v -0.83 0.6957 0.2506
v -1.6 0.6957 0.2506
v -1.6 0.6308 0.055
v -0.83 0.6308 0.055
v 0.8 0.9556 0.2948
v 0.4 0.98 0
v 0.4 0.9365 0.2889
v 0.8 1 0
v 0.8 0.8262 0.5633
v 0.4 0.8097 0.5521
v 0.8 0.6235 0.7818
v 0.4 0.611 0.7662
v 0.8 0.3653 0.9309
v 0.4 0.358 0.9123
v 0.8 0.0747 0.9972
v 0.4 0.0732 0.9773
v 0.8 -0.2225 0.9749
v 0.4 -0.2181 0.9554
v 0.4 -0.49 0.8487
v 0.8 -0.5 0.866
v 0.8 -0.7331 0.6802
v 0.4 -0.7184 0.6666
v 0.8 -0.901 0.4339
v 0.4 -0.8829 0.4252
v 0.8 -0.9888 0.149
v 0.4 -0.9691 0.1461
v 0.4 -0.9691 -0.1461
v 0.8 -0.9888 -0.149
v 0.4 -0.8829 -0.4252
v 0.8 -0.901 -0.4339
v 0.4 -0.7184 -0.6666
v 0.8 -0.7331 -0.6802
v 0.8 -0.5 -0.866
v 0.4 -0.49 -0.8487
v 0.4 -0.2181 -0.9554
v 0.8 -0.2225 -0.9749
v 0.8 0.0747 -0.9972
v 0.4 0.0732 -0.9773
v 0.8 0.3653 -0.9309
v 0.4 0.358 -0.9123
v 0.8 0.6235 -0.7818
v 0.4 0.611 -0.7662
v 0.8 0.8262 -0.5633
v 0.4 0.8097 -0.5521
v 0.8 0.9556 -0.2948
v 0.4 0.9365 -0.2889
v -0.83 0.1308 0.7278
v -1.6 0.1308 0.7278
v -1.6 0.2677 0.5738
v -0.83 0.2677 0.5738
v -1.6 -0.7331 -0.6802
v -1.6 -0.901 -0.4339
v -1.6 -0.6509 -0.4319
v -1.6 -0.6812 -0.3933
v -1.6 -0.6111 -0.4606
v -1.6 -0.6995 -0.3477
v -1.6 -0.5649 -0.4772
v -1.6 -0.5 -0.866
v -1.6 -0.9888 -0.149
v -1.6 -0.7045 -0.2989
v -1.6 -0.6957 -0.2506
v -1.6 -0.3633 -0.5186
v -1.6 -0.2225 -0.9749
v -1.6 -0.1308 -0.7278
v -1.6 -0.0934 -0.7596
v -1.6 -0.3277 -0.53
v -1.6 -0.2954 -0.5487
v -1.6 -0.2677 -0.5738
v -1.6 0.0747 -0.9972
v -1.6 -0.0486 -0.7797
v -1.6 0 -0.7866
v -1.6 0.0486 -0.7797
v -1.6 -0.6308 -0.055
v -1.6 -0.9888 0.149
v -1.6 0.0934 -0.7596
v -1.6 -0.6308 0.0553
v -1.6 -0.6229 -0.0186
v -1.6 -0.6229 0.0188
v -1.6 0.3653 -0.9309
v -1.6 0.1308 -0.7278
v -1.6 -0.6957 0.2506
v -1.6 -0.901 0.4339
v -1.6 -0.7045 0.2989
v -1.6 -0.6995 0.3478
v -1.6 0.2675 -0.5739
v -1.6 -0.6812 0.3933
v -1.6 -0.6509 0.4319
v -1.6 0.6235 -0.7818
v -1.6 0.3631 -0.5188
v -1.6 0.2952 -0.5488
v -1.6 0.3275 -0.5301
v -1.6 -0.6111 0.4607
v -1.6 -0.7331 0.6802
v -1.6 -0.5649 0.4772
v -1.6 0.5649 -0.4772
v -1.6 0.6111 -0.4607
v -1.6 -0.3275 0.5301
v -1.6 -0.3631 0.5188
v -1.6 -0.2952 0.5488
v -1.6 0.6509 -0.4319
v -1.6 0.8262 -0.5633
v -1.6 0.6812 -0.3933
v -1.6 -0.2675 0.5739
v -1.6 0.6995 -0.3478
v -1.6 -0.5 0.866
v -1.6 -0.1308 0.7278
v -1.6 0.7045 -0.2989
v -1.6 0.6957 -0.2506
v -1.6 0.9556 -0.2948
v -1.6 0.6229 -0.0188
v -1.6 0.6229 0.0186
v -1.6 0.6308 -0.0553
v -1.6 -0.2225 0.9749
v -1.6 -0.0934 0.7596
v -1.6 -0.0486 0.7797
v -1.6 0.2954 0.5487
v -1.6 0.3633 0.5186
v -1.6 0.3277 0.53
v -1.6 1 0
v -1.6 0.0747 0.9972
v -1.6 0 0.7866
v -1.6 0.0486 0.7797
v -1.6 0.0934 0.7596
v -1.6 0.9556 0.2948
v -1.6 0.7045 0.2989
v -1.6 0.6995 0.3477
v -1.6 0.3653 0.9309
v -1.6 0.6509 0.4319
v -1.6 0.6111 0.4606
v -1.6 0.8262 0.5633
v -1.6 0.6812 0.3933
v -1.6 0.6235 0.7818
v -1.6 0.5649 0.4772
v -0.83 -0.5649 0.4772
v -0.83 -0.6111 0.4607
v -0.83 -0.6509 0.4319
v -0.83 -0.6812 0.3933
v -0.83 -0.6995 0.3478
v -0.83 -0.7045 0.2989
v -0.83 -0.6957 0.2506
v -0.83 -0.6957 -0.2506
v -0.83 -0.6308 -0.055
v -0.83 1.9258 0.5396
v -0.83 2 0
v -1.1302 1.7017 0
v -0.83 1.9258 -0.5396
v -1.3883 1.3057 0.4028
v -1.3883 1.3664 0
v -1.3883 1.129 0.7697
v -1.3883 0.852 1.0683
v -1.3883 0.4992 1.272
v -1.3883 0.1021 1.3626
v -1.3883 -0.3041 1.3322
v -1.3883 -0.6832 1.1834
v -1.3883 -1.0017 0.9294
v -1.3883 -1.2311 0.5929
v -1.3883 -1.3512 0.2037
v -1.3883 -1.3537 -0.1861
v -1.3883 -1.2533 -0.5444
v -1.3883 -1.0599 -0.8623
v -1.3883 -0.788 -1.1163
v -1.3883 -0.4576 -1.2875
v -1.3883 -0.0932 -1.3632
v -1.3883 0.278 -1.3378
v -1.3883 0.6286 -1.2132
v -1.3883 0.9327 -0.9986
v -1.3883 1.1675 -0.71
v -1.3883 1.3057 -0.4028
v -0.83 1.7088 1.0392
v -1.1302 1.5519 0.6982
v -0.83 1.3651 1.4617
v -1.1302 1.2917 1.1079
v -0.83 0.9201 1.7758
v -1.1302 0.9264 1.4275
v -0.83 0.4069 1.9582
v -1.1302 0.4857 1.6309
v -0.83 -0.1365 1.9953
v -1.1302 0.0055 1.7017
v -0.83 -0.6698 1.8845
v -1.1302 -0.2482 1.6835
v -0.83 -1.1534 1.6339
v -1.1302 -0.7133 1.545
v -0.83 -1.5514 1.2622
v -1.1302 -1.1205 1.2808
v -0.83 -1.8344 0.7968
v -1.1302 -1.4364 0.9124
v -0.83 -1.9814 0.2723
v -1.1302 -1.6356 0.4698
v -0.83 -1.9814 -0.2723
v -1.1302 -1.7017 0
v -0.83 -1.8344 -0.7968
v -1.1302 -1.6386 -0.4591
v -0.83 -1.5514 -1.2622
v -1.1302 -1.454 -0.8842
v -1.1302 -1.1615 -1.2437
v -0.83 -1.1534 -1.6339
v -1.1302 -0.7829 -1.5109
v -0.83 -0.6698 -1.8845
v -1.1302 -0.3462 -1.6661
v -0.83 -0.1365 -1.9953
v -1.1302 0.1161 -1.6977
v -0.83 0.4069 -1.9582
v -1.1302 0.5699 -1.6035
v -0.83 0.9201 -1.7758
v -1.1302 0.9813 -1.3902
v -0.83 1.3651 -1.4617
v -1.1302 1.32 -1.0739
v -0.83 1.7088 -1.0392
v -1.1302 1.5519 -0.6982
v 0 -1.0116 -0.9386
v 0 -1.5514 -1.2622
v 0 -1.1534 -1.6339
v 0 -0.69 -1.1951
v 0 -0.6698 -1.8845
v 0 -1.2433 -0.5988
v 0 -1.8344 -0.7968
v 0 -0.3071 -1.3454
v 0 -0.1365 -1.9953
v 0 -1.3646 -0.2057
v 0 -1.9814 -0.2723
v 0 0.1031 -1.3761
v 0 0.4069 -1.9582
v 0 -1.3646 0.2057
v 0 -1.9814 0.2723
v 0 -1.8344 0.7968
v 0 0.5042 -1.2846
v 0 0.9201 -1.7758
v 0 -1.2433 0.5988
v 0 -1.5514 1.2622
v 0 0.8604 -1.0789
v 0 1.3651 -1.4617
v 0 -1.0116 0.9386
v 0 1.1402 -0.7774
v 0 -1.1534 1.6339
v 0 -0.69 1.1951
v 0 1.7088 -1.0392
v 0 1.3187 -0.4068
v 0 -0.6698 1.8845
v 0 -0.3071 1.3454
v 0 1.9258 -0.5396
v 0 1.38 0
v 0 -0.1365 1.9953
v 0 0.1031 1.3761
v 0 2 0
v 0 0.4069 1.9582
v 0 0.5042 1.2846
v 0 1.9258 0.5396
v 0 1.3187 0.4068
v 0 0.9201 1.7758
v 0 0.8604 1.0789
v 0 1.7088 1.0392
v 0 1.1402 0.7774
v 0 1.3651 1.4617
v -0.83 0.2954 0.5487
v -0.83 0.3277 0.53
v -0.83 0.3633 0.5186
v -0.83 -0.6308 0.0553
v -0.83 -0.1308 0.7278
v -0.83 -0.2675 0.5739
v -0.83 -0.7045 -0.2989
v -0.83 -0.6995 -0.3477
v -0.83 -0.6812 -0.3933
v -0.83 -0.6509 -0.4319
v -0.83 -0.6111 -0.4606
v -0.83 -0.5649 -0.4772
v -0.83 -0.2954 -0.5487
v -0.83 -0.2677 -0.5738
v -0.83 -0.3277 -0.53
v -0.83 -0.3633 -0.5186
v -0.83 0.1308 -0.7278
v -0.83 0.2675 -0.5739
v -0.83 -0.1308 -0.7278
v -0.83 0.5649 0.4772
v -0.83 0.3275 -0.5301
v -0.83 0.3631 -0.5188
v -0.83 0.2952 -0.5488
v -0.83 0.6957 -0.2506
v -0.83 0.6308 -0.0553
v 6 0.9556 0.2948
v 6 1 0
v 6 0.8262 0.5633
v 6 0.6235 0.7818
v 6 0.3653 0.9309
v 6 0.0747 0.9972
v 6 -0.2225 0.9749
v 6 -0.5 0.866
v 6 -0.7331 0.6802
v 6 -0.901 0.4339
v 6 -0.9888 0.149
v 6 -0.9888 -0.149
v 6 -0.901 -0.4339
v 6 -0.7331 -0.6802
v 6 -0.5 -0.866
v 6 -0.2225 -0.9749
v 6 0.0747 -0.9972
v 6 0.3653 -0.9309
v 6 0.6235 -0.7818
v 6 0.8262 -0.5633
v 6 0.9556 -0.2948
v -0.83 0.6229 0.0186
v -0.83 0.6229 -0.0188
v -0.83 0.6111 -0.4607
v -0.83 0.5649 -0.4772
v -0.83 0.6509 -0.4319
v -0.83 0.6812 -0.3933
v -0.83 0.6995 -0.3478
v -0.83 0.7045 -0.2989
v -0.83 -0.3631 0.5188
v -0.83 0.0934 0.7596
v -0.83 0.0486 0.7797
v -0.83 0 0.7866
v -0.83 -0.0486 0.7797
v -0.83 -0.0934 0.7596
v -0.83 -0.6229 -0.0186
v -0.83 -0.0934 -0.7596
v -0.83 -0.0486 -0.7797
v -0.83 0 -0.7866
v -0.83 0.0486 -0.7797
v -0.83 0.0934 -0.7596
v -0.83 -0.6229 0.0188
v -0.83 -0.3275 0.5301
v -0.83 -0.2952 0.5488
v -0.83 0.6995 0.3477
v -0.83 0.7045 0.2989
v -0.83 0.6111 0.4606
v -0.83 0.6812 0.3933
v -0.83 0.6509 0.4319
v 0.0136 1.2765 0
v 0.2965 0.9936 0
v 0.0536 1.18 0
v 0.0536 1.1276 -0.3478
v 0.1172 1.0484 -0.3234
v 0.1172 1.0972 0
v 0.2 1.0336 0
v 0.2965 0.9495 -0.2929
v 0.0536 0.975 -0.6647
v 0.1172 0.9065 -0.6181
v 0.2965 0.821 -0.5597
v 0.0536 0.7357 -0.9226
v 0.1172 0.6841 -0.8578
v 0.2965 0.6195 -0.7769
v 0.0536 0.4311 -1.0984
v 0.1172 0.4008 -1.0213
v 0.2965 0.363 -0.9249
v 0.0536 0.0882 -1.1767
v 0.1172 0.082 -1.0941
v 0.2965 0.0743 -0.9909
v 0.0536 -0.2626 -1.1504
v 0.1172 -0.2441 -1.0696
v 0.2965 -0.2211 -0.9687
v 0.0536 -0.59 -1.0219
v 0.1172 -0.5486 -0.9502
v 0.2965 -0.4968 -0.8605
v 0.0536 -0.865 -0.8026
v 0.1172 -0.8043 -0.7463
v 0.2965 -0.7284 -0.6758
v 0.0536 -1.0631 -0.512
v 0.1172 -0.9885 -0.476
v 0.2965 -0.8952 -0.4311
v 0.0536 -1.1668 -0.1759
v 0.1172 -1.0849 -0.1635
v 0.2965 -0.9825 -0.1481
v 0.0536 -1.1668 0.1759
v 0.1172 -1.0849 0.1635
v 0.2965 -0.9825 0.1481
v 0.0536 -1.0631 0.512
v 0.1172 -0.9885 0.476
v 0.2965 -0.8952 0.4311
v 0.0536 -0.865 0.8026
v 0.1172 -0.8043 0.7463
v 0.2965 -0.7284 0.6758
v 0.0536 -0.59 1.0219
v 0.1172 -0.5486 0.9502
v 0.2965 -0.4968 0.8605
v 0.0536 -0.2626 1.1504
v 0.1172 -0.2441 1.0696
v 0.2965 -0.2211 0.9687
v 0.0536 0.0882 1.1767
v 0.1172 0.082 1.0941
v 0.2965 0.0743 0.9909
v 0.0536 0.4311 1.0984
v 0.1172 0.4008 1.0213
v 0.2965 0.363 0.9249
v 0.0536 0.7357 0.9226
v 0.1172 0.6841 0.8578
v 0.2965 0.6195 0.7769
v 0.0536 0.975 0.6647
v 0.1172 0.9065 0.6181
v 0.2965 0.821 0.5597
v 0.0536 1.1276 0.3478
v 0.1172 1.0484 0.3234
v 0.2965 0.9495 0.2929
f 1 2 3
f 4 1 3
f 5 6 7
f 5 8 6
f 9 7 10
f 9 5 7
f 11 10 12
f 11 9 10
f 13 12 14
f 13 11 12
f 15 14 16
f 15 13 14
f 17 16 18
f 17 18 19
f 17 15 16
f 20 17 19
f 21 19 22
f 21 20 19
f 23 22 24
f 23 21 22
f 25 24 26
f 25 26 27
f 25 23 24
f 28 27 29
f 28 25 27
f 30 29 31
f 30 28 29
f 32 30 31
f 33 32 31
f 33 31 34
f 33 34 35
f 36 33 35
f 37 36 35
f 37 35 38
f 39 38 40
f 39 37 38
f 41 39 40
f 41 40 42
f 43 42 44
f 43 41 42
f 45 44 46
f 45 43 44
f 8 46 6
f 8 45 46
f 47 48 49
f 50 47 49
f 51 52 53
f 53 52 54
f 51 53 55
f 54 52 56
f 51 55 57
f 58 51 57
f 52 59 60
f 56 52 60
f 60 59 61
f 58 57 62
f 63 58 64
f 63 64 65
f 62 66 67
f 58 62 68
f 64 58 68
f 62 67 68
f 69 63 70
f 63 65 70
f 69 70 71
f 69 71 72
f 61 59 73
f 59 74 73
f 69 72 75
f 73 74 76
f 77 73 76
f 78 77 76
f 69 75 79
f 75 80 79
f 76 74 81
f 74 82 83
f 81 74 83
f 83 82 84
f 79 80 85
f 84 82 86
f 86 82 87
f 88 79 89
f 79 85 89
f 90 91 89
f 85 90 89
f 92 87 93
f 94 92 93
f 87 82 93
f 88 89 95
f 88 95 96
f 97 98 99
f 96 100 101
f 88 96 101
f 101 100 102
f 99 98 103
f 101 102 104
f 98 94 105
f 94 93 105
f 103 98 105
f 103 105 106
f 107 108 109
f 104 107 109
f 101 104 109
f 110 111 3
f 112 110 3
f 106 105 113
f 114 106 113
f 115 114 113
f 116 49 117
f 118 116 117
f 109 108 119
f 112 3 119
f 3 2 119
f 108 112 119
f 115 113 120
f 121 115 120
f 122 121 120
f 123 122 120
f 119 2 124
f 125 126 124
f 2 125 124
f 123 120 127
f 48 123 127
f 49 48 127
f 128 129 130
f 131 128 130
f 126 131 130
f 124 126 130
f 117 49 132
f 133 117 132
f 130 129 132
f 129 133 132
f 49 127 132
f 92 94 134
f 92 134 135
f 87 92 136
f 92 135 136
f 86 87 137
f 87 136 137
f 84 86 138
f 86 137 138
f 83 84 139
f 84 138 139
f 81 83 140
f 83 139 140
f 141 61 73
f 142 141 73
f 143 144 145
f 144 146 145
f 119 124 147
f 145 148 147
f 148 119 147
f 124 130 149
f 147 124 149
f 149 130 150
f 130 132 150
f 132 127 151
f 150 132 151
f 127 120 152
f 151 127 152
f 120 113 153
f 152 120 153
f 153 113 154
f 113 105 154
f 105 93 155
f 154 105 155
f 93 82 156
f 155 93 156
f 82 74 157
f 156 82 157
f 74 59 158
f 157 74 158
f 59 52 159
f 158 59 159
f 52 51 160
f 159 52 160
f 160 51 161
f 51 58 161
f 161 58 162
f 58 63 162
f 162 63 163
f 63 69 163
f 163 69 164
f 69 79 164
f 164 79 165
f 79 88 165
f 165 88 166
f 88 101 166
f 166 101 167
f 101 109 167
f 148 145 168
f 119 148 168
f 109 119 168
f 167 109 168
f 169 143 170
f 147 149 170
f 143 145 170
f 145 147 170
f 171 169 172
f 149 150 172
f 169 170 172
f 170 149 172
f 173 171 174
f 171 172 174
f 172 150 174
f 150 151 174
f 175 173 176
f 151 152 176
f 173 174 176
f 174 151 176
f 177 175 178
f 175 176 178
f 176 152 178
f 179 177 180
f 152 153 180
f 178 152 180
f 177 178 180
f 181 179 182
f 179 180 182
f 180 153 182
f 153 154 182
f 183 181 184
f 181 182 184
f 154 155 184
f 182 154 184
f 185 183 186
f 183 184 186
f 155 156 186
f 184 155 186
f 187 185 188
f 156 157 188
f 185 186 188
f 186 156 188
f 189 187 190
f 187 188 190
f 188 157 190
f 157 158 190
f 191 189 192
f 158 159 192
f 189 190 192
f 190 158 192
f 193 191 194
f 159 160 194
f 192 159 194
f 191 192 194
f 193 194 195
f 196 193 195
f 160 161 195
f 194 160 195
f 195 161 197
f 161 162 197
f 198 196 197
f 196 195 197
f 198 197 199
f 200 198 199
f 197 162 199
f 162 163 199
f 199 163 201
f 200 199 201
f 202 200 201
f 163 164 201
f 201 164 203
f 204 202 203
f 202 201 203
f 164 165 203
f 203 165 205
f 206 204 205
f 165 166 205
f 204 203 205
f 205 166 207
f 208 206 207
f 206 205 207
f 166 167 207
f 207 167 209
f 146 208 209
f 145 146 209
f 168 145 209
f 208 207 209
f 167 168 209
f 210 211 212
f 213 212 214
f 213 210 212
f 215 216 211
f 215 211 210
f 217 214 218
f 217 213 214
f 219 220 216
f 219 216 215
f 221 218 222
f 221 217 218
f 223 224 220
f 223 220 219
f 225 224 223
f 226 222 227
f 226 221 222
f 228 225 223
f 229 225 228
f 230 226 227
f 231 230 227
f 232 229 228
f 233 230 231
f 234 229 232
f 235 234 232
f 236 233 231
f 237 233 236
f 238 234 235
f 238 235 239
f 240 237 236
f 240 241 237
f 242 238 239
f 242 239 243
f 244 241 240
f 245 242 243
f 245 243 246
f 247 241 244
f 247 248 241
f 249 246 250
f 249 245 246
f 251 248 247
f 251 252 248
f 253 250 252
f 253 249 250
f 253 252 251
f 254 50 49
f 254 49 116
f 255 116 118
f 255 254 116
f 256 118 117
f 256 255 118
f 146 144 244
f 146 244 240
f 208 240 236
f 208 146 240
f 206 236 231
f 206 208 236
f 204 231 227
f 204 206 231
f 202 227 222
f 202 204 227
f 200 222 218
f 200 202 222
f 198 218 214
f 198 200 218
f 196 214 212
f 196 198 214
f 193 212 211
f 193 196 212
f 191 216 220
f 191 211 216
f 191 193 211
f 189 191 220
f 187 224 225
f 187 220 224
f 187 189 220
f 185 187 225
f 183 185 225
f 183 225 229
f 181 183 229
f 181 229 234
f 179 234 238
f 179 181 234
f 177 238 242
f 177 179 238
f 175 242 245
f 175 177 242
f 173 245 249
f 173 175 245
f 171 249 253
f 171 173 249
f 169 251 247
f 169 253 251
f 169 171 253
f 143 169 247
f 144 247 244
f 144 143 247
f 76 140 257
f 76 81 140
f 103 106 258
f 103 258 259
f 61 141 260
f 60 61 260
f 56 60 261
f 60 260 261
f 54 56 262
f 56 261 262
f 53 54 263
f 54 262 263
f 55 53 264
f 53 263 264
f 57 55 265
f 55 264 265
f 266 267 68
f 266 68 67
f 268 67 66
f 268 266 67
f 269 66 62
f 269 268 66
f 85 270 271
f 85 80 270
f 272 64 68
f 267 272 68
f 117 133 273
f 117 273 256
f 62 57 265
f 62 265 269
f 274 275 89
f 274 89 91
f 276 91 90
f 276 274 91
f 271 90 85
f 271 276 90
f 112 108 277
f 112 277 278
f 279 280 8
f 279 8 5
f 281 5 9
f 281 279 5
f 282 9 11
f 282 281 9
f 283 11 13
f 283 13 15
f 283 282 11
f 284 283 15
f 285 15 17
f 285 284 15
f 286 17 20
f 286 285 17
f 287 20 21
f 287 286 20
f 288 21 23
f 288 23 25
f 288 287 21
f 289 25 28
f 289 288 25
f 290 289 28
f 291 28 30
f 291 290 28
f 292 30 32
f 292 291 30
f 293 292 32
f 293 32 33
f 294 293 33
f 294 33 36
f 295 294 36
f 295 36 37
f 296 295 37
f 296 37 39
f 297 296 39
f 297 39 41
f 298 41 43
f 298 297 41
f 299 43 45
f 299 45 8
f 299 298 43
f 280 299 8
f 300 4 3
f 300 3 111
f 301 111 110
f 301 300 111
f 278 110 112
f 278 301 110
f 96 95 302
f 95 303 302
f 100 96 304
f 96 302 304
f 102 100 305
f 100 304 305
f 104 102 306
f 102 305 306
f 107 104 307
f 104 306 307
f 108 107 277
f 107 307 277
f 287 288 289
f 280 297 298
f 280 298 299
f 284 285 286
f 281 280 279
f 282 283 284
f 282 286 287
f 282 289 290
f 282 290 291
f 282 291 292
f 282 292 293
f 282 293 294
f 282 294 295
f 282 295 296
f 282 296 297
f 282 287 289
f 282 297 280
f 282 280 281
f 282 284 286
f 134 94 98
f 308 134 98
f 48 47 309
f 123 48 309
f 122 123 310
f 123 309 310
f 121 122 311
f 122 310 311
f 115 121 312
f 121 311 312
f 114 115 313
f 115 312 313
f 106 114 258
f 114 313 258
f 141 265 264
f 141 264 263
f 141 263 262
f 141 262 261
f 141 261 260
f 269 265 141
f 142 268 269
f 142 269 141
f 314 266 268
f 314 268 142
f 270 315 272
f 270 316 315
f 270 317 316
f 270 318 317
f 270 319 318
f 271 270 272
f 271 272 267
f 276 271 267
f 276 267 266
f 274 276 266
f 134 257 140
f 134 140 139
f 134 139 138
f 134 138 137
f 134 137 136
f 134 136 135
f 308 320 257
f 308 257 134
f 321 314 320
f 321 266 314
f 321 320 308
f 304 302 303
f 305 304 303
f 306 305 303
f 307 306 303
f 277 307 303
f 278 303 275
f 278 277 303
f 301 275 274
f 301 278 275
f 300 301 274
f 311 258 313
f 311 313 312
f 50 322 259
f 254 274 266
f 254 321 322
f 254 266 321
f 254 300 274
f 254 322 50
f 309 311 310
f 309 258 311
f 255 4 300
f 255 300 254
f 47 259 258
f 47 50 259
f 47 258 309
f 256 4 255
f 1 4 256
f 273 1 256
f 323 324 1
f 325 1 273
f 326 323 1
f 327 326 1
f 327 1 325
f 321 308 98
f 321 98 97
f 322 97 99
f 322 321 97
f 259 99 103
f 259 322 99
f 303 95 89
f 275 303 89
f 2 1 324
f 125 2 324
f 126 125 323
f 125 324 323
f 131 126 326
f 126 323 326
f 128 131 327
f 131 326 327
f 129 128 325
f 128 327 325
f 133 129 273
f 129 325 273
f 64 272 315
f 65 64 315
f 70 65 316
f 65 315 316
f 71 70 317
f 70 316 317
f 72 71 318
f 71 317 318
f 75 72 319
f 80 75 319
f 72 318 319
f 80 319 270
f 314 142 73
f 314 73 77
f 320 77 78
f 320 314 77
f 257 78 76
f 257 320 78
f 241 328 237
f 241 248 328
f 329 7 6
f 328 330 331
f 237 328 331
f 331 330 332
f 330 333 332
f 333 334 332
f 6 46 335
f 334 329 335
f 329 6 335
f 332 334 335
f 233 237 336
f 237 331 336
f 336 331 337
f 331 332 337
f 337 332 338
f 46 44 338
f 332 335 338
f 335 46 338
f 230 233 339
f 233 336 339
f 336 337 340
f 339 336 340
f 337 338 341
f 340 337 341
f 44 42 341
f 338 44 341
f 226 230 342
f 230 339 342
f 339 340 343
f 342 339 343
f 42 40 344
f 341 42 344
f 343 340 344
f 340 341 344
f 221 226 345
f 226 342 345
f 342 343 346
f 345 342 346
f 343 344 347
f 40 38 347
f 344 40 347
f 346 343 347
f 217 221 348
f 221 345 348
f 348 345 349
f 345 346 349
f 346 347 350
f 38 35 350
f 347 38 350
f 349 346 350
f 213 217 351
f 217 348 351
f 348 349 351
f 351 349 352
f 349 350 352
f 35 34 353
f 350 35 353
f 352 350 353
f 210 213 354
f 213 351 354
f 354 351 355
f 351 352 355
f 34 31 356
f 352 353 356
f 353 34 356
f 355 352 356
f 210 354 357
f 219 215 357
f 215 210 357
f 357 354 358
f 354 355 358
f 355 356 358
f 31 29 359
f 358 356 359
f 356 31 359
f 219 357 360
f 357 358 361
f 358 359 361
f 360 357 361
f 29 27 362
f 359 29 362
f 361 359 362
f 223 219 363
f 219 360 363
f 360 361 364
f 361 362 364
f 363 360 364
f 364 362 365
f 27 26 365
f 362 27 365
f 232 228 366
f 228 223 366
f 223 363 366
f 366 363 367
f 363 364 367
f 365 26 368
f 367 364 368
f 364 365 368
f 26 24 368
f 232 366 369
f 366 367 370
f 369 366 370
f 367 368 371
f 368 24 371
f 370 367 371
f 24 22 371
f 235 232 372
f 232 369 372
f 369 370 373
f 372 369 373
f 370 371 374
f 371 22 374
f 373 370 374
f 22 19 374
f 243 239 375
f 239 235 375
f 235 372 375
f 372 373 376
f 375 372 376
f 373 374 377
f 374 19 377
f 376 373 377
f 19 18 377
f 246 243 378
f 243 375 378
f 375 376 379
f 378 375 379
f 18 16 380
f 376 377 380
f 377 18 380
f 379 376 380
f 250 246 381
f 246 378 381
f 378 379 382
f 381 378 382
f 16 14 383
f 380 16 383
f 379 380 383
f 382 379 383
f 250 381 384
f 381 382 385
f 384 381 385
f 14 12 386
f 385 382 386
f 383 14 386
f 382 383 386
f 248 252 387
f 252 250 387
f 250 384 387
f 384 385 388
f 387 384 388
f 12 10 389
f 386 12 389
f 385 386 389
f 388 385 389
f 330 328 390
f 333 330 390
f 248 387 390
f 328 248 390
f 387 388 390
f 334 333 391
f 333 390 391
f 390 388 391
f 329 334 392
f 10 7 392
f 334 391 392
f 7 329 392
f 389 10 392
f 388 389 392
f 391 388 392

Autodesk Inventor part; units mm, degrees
ref_plane "YZ Plane" through (0, 0, 0) normal (1, 0, 0) x (0, 1, 0)
ref_plane "XZ Plane" through (0, 0, 0) normal (0, 1, 0) x (-1, 0, 0)
ref_plane "XY Plane" through (0, 0, 0) normal (0, 0, 1) x (1, 0, 0)
sketch "Sketch4" plane through (0, 0, 0) normal (0, 0, 1) x (1, 0, 0)
  line L0 (-1.6, 0) -> (6, 0)
  line L1 (0, 0) -> (-1.6, 0)
  line L2 (0, 2) -> (0, 1.38)
  line L3 (0.4, 0.98) -> (0.4, 0.98)
  line L4 (0.4, 0.98) -> (0.8, 1)
  arc A0 (0, 1.38) -> (0.4, 0.98) centre (0.4, 1.38) ccw
  line L5 (-1.6, 0) -> (-1.6, 1)
  line L6 (0, 2) -> (-0.83, 2)
  arc A1 (-0.83, 2) -> (-1.6, 1) centre (1.2707, -0.414) ccw
  line L7 (0.8, 1) -> (6, 1)
  line L8 (6, 1) -> (6, 0)
  point P0 (0, 0.98)
  dimension "d71" = 0.4
  dimension "d72" = 6
  dimension "d74" = 0.4
  dimension "d75" = 1.96
  dimension "d78" = 2
  dimension "d82" = 3.2
  dimension "d83" = 1.6
  dimension "d84" = 4
  dimension "d104" = 5.2
  dimension "d105" = 2
revolve "Revolution7" add sketch "Sketch4" angle 360 about axis through (-1.6, 0, 0) along (1, 0, 0)
sketch "Sketch5" plane through (-1.6, 0, 0) normal (-1, 0, 0) x (0, 0, 1)
  circle A0 centre (0, 0) radius 0.875 construction
  circle A1 centre (0, 0) radius 0.6125 construction
  line L0 (0, 0) -> (-0.5304, 0.3062)
  line L1 (0, 0) -> (-0.5304, -0.3063)
  line L2 (-1.8008, 0) -> (1.7887, 0)
  line L3 (-0.875, 0) -> (-0.5304, -0.3063)
  line L4 (-0.875, 0) -> (-0.5304, 0.3062)
  point P0 (0, 0)
  dimension "d88" = 1.75
  dimension "d89" = 1.225
  dimension "d90" = 30
  dimension "d91" = 30
extrude "Extrusion1" cut sketch "Sketch5" against normal blind 0.77
pattern_circular "Circular Pattern1" count 6 over 360 about axis through (-10, 0, 0) along (1, 0, 0) of "Extrusion1"
fillet "Fillet1" radius 0.175 12 edges at (-1.215, -0.7578, -0.4375) (-1.215, -0.3063, -0.5304) (-1.215, -0.6125, 0) (-1.215, -0.7578, 0.4375) (-1.215, -0.3062, 0.5304) (-1.215, 0, 0.875) (-1.215, 0.6125, 0) (-1.215, 0.7578, 0.4375) (-1.215, 0.3063, 0.5304) (-1.215, 0.3062, -0.5304) (-1.215, 0, -0.875) (-1.215, 0.7578, -0.4375)
thread "Thread7" size "M2x0.4" class "6g" standard "ISO Metric profile" length 5.2
properties part number "Šroub s válcovou hlavou a šestiramennou drážkou ISO 14583 - M2 x 6 - 4.8" material "Steel"
